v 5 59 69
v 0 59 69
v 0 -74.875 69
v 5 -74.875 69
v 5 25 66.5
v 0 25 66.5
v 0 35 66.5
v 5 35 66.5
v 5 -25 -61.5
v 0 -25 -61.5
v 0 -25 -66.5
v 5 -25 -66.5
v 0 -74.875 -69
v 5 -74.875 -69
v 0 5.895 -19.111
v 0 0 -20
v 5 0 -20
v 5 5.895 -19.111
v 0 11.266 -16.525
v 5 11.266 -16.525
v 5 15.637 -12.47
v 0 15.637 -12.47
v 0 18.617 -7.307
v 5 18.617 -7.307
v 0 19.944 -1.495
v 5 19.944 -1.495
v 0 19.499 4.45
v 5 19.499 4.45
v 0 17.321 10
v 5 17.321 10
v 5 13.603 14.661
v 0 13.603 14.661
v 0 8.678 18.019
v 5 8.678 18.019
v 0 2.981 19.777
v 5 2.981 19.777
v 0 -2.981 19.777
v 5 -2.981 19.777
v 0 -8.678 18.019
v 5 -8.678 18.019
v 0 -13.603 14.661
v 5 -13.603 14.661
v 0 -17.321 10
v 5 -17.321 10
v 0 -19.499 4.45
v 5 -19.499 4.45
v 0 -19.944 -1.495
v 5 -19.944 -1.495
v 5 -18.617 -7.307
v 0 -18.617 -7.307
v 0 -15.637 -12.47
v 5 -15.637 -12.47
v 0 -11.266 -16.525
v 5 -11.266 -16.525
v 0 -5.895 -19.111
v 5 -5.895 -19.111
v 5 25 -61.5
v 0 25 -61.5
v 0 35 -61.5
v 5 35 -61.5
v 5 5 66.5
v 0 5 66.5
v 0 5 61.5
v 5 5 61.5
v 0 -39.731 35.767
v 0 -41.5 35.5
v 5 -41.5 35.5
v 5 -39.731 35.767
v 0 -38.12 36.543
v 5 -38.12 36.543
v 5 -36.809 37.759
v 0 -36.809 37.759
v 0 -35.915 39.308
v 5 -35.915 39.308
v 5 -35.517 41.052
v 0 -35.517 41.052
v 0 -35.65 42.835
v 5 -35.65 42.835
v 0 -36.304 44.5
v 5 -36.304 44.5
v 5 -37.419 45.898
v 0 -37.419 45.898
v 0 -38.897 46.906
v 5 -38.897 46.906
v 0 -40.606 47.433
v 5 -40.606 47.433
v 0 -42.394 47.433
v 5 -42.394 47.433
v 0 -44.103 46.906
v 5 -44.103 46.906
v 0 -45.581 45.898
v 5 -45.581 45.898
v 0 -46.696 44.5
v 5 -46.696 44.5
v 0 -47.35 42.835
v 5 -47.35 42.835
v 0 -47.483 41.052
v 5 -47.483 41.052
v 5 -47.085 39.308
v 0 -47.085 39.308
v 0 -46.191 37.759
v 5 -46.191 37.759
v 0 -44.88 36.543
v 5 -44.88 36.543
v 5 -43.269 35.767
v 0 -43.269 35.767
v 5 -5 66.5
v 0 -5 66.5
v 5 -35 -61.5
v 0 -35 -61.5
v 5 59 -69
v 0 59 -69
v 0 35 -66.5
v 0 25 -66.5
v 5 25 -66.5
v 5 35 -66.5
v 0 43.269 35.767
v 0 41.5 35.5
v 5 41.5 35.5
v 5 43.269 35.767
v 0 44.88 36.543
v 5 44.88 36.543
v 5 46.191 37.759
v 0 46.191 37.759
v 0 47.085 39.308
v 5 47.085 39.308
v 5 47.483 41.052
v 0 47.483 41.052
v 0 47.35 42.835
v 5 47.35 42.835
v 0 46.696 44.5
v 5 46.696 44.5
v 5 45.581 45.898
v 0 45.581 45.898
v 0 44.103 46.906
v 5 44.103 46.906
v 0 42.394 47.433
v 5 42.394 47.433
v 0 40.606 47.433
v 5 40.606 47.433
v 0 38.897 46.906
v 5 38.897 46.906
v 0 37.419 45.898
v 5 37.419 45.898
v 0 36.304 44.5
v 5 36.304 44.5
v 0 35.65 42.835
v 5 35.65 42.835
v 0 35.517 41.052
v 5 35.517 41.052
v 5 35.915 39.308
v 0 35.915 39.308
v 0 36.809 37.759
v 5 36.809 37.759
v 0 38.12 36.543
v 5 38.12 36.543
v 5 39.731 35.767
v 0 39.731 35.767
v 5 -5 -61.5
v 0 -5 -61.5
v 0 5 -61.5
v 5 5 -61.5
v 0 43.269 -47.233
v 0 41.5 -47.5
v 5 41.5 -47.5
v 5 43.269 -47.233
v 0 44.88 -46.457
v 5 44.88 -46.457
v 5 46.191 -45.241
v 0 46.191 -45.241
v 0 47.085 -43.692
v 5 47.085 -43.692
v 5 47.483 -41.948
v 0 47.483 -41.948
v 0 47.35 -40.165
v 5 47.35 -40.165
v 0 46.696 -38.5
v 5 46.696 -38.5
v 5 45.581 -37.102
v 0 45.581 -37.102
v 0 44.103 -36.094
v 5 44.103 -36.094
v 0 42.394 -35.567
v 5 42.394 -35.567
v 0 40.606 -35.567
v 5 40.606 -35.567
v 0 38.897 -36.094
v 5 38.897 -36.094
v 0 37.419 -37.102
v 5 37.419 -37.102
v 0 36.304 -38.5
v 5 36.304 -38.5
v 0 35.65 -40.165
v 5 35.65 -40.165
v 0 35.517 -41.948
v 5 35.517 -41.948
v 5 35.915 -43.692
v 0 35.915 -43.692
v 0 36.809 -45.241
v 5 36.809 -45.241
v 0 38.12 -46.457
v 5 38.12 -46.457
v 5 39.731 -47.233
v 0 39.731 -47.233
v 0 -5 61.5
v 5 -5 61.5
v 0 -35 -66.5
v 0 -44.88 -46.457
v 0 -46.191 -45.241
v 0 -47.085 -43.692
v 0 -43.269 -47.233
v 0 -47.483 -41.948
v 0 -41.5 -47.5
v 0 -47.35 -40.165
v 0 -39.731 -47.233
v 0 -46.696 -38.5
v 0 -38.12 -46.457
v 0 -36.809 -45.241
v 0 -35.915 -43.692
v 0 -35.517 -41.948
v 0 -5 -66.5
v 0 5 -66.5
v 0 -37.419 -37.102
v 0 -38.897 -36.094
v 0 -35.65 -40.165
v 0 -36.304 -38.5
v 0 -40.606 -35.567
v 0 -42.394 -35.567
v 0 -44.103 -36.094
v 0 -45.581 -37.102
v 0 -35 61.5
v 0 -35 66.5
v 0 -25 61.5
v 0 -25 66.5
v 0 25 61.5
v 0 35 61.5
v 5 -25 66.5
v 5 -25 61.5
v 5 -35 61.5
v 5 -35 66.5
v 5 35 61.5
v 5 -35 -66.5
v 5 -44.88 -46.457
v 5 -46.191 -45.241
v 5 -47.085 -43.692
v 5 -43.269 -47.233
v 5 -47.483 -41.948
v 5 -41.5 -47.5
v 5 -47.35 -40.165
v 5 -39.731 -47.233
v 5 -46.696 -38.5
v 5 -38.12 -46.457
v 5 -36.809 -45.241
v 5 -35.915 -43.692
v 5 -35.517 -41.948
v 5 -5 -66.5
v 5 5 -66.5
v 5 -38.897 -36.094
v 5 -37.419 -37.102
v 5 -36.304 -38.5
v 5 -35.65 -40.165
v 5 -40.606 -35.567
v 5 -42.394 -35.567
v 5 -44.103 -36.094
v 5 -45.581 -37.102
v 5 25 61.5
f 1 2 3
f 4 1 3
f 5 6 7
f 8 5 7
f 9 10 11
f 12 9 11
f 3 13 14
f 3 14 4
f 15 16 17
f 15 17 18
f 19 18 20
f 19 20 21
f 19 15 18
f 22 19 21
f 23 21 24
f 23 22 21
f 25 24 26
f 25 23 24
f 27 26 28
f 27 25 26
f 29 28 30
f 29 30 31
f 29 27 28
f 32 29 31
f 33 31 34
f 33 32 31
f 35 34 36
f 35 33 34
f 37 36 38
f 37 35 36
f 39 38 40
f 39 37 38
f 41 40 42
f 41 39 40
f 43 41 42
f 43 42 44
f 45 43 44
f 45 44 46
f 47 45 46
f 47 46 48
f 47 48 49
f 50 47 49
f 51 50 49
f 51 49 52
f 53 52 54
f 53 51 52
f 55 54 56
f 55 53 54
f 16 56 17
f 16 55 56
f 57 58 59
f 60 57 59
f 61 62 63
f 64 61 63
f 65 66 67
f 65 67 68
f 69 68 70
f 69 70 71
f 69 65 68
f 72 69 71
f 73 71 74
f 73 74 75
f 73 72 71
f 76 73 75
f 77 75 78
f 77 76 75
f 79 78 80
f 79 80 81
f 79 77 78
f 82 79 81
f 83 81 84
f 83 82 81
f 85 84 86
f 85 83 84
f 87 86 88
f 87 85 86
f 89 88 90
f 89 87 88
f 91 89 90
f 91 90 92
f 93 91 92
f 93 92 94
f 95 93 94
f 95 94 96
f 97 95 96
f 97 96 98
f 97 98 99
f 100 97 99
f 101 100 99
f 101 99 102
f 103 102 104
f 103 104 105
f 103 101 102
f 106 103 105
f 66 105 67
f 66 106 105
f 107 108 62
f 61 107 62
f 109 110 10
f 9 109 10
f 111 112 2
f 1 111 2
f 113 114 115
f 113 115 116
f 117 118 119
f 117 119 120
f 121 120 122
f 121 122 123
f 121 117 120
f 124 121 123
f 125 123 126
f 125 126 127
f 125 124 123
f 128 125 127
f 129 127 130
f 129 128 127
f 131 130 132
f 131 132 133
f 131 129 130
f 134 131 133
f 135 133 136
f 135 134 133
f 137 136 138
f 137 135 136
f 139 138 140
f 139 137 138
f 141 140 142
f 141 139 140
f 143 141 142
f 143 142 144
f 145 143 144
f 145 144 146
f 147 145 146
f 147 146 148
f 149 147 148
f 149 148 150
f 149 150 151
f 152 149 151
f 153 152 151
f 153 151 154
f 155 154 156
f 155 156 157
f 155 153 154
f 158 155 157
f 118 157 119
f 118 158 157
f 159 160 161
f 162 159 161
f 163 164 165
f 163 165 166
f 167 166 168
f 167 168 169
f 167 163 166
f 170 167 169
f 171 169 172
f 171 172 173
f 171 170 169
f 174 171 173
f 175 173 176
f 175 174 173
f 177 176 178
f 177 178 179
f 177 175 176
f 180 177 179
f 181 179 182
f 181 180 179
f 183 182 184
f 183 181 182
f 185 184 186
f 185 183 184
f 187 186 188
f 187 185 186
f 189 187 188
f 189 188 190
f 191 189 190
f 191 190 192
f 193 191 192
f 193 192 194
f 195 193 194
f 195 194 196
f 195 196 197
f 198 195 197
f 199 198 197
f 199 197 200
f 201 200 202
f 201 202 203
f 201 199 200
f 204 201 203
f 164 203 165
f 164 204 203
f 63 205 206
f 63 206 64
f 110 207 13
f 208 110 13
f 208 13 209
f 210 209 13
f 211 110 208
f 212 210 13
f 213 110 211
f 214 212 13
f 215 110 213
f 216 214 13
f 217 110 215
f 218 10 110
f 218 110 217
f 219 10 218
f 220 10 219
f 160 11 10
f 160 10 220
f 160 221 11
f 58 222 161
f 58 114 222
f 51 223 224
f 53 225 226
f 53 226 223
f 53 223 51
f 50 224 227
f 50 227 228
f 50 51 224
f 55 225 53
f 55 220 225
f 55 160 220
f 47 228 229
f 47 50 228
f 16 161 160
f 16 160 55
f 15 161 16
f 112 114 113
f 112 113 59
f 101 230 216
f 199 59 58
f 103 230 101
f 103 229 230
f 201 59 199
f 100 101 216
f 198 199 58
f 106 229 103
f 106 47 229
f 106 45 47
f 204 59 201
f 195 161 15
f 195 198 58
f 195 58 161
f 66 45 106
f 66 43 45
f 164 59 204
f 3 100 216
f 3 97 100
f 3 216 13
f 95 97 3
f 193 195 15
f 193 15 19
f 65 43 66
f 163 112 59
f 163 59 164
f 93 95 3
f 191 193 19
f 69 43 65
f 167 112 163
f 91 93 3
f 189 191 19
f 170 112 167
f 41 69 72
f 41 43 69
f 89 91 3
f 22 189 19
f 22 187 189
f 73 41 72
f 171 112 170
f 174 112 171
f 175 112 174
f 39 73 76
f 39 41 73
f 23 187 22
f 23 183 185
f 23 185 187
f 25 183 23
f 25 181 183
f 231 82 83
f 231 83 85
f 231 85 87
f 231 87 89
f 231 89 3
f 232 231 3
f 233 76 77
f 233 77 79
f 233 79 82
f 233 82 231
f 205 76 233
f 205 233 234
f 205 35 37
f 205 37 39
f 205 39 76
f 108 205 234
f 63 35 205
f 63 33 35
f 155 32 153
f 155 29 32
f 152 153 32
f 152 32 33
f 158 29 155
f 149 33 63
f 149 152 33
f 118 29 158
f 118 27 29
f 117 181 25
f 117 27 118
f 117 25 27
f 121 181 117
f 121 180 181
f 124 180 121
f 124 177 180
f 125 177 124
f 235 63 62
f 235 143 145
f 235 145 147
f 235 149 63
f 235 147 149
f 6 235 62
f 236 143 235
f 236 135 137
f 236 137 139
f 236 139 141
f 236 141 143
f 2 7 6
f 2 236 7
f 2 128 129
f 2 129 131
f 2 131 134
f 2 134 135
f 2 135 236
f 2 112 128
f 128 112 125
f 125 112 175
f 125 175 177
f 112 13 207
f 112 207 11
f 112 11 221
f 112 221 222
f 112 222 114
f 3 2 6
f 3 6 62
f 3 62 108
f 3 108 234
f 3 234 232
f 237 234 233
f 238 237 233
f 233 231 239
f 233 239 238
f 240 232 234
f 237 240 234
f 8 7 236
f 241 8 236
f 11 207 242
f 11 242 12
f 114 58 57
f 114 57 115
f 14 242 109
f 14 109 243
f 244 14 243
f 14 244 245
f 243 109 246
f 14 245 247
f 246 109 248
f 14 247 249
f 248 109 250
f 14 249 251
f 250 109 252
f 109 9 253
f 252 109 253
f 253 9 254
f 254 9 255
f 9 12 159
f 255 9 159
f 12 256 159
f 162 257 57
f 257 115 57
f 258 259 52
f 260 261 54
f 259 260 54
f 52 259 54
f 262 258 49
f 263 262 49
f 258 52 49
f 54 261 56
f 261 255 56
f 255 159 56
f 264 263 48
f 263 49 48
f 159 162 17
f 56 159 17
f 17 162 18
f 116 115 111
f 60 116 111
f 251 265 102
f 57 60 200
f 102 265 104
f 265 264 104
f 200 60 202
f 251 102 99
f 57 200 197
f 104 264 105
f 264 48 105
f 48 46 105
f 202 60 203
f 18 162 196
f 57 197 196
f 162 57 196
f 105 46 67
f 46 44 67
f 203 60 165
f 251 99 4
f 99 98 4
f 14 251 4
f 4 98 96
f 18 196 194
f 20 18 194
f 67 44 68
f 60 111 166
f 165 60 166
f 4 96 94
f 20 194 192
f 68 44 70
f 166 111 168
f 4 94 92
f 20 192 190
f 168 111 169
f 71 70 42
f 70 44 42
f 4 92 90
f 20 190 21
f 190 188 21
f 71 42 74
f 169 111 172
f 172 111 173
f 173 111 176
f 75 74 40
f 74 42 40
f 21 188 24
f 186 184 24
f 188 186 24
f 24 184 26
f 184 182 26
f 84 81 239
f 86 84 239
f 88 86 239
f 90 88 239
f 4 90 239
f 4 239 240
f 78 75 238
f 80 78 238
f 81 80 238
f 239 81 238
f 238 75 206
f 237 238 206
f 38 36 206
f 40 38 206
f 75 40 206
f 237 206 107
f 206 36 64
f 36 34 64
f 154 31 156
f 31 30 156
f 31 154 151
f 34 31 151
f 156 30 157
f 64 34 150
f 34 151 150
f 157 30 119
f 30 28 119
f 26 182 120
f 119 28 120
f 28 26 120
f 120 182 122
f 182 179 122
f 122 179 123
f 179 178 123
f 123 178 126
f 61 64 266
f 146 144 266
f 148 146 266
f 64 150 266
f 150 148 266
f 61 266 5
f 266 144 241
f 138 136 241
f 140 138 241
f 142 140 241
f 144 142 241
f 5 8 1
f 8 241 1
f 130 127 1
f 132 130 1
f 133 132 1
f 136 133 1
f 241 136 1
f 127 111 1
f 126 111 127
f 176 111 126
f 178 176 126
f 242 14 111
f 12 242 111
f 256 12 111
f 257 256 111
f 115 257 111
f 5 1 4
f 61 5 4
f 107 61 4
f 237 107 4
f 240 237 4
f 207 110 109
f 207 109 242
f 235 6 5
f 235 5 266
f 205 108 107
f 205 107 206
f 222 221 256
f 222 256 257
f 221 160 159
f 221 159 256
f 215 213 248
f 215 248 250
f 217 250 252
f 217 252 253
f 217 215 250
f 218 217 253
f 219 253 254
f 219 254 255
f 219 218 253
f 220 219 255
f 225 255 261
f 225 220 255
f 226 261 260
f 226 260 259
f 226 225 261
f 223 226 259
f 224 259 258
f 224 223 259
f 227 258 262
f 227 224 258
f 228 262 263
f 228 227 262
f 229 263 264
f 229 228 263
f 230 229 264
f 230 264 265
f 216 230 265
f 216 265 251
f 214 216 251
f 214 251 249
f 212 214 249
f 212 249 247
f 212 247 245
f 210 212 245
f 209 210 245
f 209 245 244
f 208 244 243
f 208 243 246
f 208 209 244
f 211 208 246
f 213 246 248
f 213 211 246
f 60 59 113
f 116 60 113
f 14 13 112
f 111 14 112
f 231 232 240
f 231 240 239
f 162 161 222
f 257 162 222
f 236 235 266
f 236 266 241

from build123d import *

# Parameters (mm, degrees)
SKETCH4_R           = 6
SKETCH4_R_2         = 20
SKETCH4_W           = 5
SKETCH4_H           = 9.999474932
BOSS_EXTRUDE2_DEPTH = 5


with BuildPart() as part:
    # Sketch4 → Boss-Extrude2 (new body)
    with BuildSketch(Plane(origin=(0, 0, 0), x_dir=(0, 0, -1), z_dir=(1, 0, 0))):
        Polygon((-59, 59), (59, 59), (69, 59), (69, -59), (69, -74.875), (-69, -74.875), (-69, -59), (-69, 59), align=None)
        with Locations((41.5, 41.5)):
            Circle(SKETCH4_R, mode=Mode.SUBTRACT)
        with Locations((41.5, -41.5)):
            Circle(SKETCH4_R, mode=Mode.SUBTRACT)
        with Locations((-41.5, 41.5)):
            Circle(SKETCH4_R, mode=Mode.SUBTRACT)
        with Locations((-41.5, -41.5)):
            Circle(SKETCH4_R, mode=Mode.SUBTRACT)
        Circle(SKETCH4_R_2, mode=Mode.SUBTRACT)
        with Locations((-64, 0)):
            Rectangle(SKETCH4_W, SKETCH4_H, mode=Mode.SUBTRACT)
        with Locations((-64, 30)):
            Rectangle(SKETCH4_W, SKETCH4_H, mode=Mode.SUBTRACT)
        with Locations((-64, -30)):
            Rectangle(SKETCH4_W, SKETCH4_H, mode=Mode.SUBTRACT)
        with Locations((64, 30)):
            Rectangle(SKETCH4_W, SKETCH4_H, mode=Mode.SUBTRACT)
        with Locations((64, 0)):
            Rectangle(SKETCH4_W, SKETCH4_H, mode=Mode.SUBTRACT)
        with Locations((64, -30)):
            Rectangle(SKETCH4_W, SKETCH4_H, mode=Mode.SUBTRACT)
    extrude(amount=BOSS_EXTRUDE2_DEPTH)


solid = part.part
